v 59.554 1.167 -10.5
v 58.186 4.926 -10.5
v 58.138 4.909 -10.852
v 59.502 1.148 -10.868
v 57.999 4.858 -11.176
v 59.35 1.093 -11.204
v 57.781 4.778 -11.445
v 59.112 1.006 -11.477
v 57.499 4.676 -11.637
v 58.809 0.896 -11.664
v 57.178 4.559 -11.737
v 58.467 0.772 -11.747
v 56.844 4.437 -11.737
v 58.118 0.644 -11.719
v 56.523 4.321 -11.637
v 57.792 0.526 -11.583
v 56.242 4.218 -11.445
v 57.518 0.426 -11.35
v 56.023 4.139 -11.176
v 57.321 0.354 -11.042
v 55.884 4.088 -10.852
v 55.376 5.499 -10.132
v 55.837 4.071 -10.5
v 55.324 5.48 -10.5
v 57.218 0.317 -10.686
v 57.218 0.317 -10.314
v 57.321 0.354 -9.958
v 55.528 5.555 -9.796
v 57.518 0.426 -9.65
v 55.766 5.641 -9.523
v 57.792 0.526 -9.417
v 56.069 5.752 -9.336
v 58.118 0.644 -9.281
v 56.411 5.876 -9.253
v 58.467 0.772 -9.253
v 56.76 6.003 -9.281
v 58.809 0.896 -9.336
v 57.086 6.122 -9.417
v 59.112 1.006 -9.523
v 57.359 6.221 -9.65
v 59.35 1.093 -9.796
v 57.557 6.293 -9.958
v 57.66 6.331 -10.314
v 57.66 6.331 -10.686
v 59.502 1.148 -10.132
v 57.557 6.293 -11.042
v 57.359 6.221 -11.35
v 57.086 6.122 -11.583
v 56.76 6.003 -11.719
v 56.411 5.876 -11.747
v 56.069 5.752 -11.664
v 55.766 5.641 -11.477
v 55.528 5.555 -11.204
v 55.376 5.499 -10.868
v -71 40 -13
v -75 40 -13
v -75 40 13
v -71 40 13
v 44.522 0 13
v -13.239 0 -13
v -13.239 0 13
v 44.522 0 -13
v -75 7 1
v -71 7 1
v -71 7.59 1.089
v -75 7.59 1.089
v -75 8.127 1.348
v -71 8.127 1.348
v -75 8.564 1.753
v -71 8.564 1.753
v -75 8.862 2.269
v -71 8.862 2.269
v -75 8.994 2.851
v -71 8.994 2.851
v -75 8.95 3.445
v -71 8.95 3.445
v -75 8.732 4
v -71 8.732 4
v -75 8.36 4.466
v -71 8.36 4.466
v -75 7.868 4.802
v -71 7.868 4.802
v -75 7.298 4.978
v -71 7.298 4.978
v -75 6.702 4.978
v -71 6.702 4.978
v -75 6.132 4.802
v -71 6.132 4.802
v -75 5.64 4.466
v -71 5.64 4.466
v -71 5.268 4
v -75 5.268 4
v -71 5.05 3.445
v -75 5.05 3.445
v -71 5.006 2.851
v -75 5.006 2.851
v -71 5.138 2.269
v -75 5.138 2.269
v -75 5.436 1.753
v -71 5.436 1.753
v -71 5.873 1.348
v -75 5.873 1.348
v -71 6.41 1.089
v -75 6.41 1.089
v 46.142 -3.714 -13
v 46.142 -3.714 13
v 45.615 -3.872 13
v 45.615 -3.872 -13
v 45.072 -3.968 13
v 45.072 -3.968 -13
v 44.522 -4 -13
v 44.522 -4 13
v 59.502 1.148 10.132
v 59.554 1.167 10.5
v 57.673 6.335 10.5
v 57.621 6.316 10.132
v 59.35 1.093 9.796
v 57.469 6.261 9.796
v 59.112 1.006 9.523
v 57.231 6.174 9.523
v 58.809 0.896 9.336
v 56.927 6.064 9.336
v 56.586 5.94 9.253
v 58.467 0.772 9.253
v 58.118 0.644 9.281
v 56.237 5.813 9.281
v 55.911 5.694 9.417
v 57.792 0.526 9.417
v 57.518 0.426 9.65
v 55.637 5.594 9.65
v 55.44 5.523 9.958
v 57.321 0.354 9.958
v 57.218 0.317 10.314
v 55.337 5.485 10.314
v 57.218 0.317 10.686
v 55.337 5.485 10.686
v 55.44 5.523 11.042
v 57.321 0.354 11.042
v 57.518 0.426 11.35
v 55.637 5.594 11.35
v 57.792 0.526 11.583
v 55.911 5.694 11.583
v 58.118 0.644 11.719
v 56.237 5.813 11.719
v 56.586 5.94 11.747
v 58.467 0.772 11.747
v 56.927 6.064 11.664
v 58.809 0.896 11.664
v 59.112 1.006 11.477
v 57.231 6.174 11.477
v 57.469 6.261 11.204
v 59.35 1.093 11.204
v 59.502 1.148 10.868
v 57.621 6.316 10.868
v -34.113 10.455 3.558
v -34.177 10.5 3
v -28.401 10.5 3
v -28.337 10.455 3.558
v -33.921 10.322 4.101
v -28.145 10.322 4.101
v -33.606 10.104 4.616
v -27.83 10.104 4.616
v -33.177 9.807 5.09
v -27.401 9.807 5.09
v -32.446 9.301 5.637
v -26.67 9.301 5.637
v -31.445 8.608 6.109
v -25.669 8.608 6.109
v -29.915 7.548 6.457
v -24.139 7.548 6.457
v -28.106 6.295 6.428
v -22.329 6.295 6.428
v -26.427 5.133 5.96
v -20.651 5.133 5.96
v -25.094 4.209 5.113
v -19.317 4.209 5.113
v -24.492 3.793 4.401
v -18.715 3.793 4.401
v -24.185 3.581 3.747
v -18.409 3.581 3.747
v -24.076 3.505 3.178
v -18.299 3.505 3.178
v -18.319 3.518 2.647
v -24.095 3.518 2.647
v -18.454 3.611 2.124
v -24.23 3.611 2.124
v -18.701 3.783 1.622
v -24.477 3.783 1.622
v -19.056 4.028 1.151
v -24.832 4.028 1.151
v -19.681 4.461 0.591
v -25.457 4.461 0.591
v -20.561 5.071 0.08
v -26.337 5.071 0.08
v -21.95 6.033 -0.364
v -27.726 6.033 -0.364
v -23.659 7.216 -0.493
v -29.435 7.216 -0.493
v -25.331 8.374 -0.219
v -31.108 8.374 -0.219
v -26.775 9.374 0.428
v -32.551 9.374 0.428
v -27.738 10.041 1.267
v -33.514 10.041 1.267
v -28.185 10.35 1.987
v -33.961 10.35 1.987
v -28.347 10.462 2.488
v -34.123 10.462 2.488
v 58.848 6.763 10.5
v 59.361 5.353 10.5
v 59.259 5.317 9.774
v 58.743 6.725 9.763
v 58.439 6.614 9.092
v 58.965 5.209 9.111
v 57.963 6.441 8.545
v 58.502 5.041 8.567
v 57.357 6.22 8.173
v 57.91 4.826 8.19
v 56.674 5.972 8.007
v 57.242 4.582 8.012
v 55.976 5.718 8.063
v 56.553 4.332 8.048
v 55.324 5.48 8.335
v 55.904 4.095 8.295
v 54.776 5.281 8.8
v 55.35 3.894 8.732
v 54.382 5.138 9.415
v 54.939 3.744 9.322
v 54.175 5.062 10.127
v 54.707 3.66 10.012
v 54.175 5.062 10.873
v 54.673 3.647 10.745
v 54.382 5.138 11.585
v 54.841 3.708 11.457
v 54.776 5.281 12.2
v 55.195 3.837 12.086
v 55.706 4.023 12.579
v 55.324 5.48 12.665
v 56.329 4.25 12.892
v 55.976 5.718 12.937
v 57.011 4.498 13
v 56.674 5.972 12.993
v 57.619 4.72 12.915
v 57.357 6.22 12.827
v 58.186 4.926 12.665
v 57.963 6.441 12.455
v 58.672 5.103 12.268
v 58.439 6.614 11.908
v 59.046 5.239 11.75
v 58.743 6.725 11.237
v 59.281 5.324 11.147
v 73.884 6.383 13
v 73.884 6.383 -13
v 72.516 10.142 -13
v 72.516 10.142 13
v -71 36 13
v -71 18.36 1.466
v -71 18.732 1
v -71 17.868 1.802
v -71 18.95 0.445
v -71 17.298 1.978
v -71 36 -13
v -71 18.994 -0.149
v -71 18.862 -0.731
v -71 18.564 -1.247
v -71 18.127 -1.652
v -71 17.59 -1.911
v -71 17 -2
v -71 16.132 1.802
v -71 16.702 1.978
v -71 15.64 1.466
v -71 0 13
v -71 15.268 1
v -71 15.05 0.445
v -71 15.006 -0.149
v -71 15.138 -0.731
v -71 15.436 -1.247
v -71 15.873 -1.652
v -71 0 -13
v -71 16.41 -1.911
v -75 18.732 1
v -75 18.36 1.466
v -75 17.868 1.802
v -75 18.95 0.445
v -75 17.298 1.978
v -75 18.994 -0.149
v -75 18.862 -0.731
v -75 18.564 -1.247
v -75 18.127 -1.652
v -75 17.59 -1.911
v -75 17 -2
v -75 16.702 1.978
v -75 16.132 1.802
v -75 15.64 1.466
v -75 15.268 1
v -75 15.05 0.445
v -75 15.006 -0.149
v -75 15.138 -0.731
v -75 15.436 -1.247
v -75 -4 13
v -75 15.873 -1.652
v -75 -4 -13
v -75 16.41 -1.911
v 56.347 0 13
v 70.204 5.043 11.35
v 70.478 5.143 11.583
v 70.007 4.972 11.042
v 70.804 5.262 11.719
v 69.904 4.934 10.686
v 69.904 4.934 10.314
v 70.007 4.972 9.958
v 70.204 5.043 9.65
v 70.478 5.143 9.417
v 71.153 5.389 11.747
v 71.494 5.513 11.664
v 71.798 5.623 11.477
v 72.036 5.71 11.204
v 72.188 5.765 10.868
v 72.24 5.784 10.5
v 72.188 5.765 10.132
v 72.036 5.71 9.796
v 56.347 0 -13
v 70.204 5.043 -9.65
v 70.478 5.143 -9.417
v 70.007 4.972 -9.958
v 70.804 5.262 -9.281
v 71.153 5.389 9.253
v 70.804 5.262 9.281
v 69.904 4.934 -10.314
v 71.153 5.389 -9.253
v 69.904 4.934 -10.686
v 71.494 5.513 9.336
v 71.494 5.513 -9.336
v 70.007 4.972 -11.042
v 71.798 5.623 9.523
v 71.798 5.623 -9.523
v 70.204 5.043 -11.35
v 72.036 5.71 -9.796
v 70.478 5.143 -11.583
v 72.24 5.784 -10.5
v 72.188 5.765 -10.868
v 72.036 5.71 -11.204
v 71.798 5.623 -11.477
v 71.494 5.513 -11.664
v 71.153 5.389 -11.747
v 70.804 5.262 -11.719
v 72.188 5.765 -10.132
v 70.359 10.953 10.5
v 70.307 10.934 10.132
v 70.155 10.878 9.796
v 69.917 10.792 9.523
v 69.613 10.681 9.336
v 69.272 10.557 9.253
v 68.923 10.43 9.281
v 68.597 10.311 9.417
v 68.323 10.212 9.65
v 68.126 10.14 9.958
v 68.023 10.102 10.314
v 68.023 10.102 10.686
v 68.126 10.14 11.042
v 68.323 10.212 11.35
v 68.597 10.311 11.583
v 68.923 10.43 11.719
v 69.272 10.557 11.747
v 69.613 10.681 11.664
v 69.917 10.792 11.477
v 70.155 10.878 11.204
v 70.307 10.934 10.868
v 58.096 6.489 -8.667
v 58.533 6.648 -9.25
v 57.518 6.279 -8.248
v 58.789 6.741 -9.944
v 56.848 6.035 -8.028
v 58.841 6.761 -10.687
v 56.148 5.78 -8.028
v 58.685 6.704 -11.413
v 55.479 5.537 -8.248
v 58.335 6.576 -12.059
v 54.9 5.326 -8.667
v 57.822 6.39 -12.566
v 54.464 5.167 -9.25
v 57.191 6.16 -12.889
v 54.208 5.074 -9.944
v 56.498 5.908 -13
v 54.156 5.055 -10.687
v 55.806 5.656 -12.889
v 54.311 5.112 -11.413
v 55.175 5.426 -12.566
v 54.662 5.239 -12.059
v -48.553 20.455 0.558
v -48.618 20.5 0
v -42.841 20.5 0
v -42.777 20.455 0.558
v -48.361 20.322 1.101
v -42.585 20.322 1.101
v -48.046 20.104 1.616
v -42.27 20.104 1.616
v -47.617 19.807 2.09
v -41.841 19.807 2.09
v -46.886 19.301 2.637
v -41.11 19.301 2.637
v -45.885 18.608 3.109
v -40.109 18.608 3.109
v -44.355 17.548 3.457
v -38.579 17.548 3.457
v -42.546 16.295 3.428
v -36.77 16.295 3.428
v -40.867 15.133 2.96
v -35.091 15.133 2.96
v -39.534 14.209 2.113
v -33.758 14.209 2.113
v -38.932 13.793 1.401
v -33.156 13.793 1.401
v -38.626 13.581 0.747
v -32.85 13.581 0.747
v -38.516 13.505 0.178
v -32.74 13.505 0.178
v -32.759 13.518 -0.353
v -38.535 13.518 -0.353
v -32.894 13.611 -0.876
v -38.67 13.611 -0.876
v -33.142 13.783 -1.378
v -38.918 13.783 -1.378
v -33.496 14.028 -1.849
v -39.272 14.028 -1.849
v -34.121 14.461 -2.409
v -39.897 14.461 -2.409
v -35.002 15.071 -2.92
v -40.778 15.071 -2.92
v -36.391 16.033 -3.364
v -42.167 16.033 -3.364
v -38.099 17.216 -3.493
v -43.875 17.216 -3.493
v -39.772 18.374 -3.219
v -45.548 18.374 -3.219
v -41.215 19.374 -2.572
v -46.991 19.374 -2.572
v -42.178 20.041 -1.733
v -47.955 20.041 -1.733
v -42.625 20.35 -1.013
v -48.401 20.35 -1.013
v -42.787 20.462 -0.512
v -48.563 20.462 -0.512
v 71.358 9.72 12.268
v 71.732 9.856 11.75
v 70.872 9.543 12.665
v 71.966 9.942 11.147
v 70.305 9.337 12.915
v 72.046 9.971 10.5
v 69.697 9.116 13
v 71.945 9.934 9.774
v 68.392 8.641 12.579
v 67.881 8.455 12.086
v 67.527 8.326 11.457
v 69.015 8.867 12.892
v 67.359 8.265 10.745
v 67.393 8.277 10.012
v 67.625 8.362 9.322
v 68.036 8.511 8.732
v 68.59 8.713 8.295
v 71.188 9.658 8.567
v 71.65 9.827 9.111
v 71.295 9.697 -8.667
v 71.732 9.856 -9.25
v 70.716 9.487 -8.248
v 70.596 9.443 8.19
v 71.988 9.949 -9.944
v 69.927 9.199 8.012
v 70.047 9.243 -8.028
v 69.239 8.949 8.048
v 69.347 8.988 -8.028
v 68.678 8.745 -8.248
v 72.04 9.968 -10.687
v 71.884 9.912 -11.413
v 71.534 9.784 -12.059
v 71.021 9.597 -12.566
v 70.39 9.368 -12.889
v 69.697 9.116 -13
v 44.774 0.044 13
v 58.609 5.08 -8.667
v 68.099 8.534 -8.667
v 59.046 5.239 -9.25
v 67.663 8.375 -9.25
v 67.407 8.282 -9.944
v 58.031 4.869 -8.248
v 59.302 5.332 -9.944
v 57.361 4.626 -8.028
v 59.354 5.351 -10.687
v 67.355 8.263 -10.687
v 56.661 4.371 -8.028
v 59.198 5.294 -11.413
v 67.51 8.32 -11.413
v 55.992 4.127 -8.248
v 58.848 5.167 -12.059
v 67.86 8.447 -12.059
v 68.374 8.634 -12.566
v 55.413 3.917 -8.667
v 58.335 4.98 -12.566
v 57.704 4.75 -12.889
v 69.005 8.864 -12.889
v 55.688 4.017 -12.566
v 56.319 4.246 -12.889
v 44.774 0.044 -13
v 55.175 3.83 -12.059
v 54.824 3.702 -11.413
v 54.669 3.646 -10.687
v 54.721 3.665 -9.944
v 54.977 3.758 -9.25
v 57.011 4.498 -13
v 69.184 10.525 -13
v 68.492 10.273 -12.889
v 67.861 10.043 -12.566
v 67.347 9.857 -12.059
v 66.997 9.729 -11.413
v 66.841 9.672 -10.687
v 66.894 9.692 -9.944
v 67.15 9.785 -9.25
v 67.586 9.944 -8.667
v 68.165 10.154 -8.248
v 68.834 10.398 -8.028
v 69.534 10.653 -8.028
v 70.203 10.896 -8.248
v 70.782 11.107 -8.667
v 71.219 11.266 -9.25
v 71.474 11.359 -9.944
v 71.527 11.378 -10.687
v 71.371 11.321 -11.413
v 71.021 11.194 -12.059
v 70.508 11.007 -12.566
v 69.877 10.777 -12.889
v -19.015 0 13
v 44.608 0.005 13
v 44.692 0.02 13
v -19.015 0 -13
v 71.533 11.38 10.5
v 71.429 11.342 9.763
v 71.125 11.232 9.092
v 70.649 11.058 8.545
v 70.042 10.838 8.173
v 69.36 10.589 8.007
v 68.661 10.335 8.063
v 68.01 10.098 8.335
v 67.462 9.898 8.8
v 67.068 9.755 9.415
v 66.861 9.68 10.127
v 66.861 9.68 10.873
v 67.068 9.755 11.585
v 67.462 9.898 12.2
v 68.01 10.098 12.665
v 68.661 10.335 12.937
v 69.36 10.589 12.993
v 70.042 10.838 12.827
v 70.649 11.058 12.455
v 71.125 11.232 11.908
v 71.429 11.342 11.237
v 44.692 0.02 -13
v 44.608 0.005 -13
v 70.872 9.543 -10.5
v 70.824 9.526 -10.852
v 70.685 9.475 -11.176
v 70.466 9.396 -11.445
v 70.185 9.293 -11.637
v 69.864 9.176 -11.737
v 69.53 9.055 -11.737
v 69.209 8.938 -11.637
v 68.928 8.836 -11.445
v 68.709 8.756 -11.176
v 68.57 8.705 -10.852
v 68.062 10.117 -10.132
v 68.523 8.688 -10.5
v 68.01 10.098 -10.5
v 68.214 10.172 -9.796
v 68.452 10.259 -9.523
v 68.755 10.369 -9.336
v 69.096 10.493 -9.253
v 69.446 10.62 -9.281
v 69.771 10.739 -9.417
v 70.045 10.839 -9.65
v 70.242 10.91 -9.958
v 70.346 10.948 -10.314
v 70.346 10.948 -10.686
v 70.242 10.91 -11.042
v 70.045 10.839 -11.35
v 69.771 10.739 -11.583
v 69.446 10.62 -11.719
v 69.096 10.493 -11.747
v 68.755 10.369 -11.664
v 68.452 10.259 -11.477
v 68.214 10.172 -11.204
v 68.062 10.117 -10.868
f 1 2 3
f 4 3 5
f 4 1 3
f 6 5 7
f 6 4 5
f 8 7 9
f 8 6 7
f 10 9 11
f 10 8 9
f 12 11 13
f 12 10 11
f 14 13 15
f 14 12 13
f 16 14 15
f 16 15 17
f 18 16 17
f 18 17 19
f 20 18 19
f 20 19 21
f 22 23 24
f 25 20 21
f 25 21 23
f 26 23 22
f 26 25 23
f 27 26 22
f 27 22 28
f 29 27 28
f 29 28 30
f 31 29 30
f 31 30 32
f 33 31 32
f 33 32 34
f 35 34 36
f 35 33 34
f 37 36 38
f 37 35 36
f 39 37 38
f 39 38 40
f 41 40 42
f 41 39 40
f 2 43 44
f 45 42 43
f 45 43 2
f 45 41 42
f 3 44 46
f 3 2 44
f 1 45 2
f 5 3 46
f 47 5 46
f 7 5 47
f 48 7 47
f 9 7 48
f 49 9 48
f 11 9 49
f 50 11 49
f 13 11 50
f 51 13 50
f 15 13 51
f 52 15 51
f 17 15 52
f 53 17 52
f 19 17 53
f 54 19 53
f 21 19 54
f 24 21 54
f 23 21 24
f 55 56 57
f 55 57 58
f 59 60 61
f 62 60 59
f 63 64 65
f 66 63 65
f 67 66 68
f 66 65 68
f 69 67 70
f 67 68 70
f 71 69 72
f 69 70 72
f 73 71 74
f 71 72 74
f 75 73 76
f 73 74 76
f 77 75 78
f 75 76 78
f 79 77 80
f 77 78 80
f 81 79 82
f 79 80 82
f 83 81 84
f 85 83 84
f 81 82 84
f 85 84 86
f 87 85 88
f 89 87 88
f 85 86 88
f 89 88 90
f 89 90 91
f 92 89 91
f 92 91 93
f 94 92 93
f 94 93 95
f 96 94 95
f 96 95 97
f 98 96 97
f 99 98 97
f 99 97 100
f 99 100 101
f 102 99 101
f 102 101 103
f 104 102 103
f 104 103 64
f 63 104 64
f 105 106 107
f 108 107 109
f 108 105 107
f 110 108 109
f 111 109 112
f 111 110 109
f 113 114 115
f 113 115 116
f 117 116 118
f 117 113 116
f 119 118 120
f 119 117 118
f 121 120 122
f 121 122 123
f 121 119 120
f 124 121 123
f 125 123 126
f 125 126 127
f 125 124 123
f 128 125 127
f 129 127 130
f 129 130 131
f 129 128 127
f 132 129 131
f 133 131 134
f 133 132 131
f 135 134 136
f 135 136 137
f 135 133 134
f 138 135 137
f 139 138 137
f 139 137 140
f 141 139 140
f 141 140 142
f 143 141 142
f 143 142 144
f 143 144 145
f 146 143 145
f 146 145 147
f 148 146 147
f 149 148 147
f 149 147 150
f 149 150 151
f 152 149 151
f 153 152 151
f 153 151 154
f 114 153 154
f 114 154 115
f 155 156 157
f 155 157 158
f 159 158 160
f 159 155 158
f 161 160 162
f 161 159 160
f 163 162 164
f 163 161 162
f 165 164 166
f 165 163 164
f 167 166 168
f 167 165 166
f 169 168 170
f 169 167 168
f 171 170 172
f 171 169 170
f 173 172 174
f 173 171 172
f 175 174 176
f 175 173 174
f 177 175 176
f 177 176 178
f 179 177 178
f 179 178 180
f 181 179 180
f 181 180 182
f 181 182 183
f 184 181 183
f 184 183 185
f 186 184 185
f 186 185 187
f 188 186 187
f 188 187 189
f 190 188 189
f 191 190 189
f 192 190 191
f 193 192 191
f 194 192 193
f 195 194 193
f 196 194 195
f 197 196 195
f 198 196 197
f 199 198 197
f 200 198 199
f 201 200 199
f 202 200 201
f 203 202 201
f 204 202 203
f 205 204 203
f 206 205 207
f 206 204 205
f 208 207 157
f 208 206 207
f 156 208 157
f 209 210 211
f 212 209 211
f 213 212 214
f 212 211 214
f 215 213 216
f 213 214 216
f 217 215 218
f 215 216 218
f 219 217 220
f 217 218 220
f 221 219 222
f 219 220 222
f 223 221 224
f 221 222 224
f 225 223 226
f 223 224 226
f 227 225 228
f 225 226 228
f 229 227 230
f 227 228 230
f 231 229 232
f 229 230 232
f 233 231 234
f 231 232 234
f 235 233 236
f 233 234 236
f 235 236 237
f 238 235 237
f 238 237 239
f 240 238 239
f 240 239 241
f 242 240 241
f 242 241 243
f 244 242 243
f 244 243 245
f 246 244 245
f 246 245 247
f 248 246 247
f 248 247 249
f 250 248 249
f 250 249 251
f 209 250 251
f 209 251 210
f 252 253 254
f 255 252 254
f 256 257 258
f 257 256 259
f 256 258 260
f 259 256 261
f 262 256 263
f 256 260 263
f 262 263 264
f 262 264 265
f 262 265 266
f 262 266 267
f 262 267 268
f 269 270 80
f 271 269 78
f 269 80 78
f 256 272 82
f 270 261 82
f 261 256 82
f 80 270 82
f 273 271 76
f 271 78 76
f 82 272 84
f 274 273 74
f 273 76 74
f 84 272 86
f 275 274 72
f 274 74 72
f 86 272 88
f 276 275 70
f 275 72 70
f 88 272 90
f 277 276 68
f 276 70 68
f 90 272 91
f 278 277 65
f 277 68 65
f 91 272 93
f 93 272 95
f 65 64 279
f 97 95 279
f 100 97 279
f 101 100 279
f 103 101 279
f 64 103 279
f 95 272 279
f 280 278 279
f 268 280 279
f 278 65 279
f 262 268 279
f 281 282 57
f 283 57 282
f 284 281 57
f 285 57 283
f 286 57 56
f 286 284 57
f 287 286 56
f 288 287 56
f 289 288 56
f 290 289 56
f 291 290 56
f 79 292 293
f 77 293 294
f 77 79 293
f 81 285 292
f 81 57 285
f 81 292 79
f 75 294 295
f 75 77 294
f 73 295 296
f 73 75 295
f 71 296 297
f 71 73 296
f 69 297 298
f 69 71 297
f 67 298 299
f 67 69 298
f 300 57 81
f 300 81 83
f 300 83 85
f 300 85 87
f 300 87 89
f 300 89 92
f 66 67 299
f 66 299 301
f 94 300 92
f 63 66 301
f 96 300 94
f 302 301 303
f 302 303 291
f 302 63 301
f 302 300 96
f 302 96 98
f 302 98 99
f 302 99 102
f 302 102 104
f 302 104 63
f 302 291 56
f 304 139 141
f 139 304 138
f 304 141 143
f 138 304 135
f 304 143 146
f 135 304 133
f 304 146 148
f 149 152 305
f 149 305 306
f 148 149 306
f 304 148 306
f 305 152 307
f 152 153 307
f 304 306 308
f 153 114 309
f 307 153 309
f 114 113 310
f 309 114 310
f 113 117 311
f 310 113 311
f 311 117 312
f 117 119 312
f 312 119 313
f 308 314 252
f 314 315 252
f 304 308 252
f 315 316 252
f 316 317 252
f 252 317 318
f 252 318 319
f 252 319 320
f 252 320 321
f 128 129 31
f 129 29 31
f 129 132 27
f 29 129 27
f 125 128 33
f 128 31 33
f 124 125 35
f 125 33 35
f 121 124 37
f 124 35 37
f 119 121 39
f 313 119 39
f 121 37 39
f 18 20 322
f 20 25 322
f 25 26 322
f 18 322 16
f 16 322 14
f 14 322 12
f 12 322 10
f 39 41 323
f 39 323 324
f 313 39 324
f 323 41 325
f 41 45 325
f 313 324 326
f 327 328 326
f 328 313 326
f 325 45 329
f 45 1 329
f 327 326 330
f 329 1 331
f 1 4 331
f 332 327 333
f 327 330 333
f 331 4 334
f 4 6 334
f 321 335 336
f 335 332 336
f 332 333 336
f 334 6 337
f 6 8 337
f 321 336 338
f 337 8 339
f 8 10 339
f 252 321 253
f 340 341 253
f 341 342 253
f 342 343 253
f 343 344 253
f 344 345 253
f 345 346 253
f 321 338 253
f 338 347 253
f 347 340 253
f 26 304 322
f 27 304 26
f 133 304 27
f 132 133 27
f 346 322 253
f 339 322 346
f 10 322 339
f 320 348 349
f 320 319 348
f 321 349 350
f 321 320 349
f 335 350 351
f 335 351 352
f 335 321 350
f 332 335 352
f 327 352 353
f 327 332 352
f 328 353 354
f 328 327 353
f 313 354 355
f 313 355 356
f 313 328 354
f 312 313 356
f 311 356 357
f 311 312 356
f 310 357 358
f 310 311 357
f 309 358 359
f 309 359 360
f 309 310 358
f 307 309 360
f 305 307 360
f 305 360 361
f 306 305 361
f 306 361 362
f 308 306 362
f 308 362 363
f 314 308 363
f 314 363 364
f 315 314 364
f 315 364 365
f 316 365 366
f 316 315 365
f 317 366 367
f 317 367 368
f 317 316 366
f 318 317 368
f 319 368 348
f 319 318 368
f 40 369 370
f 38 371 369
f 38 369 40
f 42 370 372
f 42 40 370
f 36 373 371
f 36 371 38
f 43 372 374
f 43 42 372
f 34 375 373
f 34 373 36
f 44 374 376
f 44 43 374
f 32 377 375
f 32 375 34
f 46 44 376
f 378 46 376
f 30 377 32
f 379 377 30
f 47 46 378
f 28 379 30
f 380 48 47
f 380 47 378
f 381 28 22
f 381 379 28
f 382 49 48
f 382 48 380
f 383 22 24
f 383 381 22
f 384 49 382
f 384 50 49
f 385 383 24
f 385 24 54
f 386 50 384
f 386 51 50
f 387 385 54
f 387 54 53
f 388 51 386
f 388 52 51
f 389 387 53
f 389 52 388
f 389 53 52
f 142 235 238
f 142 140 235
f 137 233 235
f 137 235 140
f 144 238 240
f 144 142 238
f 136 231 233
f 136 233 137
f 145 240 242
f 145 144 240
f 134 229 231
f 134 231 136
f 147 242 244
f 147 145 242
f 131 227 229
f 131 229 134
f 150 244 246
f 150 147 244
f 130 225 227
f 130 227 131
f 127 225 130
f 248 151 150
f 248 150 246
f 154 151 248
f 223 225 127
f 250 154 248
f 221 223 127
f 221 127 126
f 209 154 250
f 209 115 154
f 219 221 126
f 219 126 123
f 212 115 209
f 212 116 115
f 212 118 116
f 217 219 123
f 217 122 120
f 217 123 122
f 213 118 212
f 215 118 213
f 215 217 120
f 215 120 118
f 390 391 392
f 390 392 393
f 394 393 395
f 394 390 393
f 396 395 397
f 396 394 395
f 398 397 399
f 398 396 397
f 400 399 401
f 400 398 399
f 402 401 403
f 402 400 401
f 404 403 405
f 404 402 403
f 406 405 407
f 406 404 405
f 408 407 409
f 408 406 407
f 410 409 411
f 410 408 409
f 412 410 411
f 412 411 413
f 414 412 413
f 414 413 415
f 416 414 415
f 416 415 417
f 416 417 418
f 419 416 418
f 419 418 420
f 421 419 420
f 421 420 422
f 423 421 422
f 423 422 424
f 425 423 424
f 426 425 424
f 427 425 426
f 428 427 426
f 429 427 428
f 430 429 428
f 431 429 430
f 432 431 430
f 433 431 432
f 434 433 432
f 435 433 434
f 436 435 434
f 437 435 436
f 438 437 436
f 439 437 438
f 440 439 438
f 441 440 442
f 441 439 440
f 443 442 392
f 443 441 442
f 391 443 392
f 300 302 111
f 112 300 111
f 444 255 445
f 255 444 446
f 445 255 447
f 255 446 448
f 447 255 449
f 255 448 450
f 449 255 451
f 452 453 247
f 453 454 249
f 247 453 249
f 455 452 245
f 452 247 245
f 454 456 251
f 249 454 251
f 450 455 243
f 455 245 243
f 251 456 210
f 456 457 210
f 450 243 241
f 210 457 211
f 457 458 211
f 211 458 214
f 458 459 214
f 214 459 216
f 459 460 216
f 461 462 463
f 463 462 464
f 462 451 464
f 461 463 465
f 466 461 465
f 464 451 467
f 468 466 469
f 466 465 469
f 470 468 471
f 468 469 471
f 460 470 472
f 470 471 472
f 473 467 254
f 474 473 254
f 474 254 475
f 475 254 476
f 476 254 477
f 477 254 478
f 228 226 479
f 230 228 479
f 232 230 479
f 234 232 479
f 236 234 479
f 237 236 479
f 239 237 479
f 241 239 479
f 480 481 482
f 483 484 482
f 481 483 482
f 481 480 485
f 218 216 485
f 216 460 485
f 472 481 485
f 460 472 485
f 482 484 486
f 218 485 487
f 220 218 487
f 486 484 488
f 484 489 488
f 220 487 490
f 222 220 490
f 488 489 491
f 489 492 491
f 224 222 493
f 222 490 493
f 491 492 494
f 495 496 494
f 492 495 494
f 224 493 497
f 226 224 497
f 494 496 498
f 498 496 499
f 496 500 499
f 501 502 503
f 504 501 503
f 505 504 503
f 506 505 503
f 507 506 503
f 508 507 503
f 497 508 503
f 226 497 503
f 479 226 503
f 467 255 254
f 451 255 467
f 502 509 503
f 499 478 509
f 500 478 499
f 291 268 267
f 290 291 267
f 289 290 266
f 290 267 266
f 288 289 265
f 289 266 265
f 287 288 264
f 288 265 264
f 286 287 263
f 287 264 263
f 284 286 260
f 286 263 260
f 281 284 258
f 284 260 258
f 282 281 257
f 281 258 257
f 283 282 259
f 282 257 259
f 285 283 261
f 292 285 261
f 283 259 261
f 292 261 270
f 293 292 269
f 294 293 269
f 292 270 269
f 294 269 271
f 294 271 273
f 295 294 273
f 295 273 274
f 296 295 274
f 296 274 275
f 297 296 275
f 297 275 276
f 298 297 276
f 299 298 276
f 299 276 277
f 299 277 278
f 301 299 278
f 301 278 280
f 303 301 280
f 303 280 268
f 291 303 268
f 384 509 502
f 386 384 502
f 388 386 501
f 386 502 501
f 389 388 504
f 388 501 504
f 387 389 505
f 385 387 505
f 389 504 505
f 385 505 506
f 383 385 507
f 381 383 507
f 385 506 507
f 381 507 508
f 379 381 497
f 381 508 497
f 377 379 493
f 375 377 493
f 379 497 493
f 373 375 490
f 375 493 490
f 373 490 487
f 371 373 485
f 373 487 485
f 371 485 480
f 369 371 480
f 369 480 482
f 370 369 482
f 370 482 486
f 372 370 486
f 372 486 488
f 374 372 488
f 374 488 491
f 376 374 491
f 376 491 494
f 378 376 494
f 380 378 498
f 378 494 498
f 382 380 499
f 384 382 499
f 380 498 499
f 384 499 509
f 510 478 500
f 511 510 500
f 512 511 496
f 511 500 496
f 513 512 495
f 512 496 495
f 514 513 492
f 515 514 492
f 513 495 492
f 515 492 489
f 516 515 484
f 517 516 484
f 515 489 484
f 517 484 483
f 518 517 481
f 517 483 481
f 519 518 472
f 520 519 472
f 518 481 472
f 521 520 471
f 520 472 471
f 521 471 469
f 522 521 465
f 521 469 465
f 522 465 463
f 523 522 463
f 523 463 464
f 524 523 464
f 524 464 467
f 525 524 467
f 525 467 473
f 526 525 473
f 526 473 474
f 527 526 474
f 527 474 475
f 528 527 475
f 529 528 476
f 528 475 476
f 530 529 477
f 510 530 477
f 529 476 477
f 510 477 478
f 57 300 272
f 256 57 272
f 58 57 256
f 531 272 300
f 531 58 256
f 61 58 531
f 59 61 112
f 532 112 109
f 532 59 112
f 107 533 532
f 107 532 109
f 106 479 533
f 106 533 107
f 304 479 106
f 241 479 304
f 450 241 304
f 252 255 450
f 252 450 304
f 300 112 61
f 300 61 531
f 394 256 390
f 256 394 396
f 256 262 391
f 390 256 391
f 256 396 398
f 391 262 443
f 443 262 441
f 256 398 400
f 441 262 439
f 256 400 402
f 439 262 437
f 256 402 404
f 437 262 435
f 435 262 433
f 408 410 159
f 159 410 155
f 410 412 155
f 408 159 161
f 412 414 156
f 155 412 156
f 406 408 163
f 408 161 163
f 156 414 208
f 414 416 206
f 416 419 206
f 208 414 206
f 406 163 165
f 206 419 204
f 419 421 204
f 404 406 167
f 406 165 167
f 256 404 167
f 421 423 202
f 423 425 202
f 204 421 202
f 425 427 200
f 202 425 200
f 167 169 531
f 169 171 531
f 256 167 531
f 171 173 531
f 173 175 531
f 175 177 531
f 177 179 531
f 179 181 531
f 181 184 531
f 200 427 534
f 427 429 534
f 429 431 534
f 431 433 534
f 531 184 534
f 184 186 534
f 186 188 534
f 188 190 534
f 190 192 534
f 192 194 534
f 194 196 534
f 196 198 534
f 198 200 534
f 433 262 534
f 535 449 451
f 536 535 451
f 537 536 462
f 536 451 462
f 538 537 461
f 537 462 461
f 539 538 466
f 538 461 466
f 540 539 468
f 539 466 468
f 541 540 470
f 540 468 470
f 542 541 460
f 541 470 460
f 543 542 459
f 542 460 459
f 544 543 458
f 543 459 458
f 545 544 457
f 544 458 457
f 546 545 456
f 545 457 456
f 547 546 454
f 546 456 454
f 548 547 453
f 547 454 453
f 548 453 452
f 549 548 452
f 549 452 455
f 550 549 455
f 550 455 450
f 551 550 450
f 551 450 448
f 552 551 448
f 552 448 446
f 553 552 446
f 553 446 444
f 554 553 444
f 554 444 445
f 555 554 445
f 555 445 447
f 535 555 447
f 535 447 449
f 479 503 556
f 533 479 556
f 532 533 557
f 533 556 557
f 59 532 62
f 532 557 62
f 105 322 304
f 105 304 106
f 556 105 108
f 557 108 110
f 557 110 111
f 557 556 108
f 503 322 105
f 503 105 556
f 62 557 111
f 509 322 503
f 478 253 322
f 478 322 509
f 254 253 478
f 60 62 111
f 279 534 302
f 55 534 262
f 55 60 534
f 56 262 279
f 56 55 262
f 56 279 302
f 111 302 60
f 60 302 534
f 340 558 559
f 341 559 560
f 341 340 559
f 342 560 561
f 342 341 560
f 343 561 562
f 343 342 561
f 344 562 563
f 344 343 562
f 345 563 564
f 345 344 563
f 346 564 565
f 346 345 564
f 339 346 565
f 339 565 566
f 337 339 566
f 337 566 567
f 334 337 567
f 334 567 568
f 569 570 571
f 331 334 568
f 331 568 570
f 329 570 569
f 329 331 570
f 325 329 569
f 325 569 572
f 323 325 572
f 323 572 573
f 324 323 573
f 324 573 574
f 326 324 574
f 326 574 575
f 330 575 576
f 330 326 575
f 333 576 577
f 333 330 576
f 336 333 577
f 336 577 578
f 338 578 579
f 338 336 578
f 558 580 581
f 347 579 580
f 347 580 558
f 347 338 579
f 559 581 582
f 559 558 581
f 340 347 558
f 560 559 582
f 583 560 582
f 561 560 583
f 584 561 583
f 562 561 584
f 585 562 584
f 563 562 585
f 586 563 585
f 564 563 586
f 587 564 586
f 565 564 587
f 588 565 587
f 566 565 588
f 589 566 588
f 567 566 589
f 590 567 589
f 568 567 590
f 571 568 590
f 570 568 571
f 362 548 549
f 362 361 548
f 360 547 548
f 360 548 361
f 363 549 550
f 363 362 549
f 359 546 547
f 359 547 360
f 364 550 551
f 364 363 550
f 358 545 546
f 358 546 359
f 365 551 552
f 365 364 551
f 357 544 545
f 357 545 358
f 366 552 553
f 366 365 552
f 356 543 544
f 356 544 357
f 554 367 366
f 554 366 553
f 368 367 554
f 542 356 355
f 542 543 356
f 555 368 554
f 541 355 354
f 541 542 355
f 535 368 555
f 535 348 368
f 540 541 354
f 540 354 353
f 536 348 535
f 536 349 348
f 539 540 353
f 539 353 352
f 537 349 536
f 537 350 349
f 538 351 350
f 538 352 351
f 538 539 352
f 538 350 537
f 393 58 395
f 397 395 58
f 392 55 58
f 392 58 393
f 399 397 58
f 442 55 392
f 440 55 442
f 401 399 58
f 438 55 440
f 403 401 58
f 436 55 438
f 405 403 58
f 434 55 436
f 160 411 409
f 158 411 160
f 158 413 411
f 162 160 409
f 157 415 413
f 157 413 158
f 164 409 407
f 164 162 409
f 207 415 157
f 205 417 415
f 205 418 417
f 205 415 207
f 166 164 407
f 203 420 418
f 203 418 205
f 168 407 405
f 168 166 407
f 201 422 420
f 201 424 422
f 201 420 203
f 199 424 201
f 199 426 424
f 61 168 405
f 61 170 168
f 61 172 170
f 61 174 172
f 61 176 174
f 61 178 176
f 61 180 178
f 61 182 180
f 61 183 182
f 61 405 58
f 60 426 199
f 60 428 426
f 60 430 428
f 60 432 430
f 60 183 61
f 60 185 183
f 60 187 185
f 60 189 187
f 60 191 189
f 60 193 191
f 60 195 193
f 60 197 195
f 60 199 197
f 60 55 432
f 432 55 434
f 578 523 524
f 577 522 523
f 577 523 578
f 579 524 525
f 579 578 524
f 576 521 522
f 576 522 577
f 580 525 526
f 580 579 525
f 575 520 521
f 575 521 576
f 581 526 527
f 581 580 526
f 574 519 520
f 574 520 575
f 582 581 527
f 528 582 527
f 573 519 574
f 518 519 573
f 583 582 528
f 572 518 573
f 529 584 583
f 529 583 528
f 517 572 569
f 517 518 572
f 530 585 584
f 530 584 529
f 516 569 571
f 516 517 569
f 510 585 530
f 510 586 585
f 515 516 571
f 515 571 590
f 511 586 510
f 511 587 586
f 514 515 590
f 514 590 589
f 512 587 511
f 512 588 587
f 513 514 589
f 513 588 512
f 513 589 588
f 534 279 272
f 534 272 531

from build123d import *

# Parameters (mm, degrees)
ESQUISSE2_W                 = 150
ESQUISSE2_H                 = 26
T_LE_DE_BASE_PLI_E1_DEPTH   = 4
PLI_START                   = -13
PLI_ESQUISS_1_DEPTH         = 26
PLI_ESQUISS_1_2_DEPTH       = 26
ESQUISSE9_R                 = 2.5
ESQUISSE9_R_2               = 1.25
BOSS_EXTRU_1_DEPTH          = 1.5
ENL_V_START                 = -4
ENL_V_MAT_EXTRU_1_OUTLINE_R = 1.25
ENL_V_MAT_EXTRU_1_DEPTH     = 4
ESQUISSE11_W                = 4
ESQUISSE11_H                = 26
BOSS_EXTRU_2_DEPTH          = 40
BOSS_EXTRU_3_DEPTH          = 4
ESQUISSE12_R                = 2
ENL_V_MAT_EXTRU_5_DEPTH     = 151.86574353
ENL_V_MAT_EXTRU_6_REACH     = 152.866
ESQUISSE12_4_R              = 3.5
ESQUISSE12_4_R_2            = 2


# Read off the part's stored shape, not the designer's step: Pli esquissé1, Enlèv. mat.-Extru.1
# Sheet-metal steps are written as plain solids
with BuildPart() as part:
    # Esquisse2 → Tôle de base pliée1 (new body)
    with BuildSketch(Plane(origin=(0, 0, 0), x_dir=(1, 0, 0), z_dir=(0, 1, 0))):
        Rectangle(ESQUISSE2_W, ESQUISSE2_H)
    extrude(amount=-T_LE_DE_BASE_PLI_E1_DEPTH)

    # Pli esquissé1 outline → Pli esquissé1 (cut)
    with BuildSketch(Plane.XY.offset(PLI_START)):
        with BuildLine():
            Line((75, 0), (56.347473252, 0))
            Line((56.347473252, 0), (46.142385808, -3.714348068))
            ThreePointArc((46.142385808, -3.714348068), (45.344875155, -3.928040403), (44.522373197, -4))
            Line((44.522373197, -4), (75, -4))
            Line((75, -4), (75, 0))
        make_face()
    extrude(amount=PLI_ESQUISS_1_DEPTH, mode=Mode.SUBTRACT)

    # Pli esquiss_1 2 outline → Pli esquiss_1 2 (add)
    with BuildSketch(Plane.XY.offset(PLI_START)):
        with BuildLine():
            Line((56.347473252, 0), (73.884342049, 6.382898245))
            Line((73.884342049, 6.382898245), (72.516261476, 10.141668728))
            Line((72.516261476, 10.141668728), (44.774305234, 0.044422416))
            ThreePointArc((44.774305234, 0.044422416), (44.650282444, 0.011190609), (44.522373197, 0))
            Line((44.522373197, 0), (56.347473252, 0))
        make_face()
    extrude(amount=PLI_ESQUISS_1_2_DEPTH)

    # Esquisse9 → Boss.-Extru.1 (add)
    # profile 1 of 4: a face of its own
    with BuildSketch(Plane(origin=(5.223321668, -14.350958338, 0), x_dir=(0.9396926207859082, 0.34202014332566943, 0), z_dir=(-0.34202014332566943, 0.9396926207859082, 0))):
        with Locations(Location((55.111650787, 10.5, 0), (0, 0, 90))):
            Circle(ESQUISSE9_R)
        with Locations(Location((55.111650787, 10.5, 0), (0, 0, 180))):
            Circle(ESQUISSE9_R_2, mode=Mode.SUBTRACT)
    # profile 2 of 4: a face of its own
    with BuildSketch(Plane(origin=(5.223321668, -14.350958338, 0), x_dir=(0.9396926207859082, 0.34202014332566943, 0), z_dir=(-0.34202014332566943, 0.9396926207859082, 0))):
        with Locations(Location((68.611650787, 10.5, 0), (0, 0, 90))):
            Circle(ESQUISSE9_R)
        with Locations(Location((68.611650787, 10.5, 0), (0, 0, 180))):
            Circle(ESQUISSE9_R_2, mode=Mode.SUBTRACT)
    # profile 3 of 4: a face of its own
    with BuildSketch(Plane(origin=(5.223321668, -14.350958338, 0), x_dir=(0.9396926207859082, 0.34202014332566943, 0), z_dir=(-0.34202014332566943, 0.9396926207859082, 0))):
        with Locations((68.611650787, -10.5)):
            Circle(ESQUISSE9_R)
        with Locations((68.611650787, -10.5)):
            Circle(ESQUISSE9_R_2, mode=Mode.SUBTRACT)
    # profile 4 of 4: a face of its own
    with BuildSketch(Plane(origin=(5.223321668, -14.350958338, 0), x_dir=(0.9396926207859082, 0.34202014332566943, 0), z_dir=(-0.34202014332566943, 0.9396926207859082, 0))):
        with Locations((55.111650787, -10.5)):
            Circle(ESQUISSE9_R)
        with Locations((55.111650787, -10.5)):
            Circle(ESQUISSE9_R_2, mode=Mode.SUBTRACT)
    extrude(amount=BOSS_EXTRU_1_DEPTH)

    # Enlèv. mat.-Extru.1 outline → Enlèv. mat.-Extru.1 (cut)
    with BuildSketch(Plane(origin=(5.223321668, -14.350958338, 0), x_dir=(0.9396926207859082, 0.34202014332566943, 0), z_dir=(-0.34202014332566943, 0.9396926207859082, 0)).offset(ENL_V_START)):
        with Locations((68.611650787, 10.5)):
            Circle(ENL_V_MAT_EXTRU_1_OUTLINE_R)
        with Locations((68.611650787, -10.5)):
            Circle(ENL_V_MAT_EXTRU_1_OUTLINE_R)
        with Locations((55.111650787, 10.5)):
            Circle(ENL_V_MAT_EXTRU_1_OUTLINE_R)
        with Locations((55.111650787, -10.5)):
            Circle(ENL_V_MAT_EXTRU_1_OUTLINE_R)
    extrude(amount=ENL_V_MAT_EXTRU_1_DEPTH, mode=Mode.SUBTRACT)

    # Esquisse11 → Boss.-Extru.2 (add)
    with BuildSketch(Plane(origin=(0, 0, 0), x_dir=(1, 0, 0), z_dir=(0, 1, 0))):
        with Locations((-73, 0)):
            Rectangle(ESQUISSE11_W, ESQUISSE11_H)
    extrude(amount=BOSS_EXTRU_2_DEPTH)

    # Esquisse3D1 → Boss.-Extru.3 (add, along a direction that is not the sketch's normal)
    with BuildSketch(Plane(origin=(-71, 40, -13), x_dir=(0.7710162866859277, -0.533933827949873, 0.34705698816741753), z_dir=(0.5693204883585811, 0.8221156740600114, 0))):
        Polygon((0, 0), (9.023481692, -24.38394509), (74.915650416, 0), (65.892168724, 24.38394509), align=None)
    extrude(amount=-BOSS_EXTRU_3_DEPTH, dir=(0, 1, 0))

    # Esquisse12 → Enlèv. mat.-Extru.5 (cut, through all)
    with BuildSketch(Plane(origin=(-71, 0, 0), x_dir=(0, 0, -1), z_dir=(1, 0, 0))):
        with Locations((-3, 7)):
            Circle(ESQUISSE12_R)
        with Locations((0, 17)):
            Circle(ESQUISSE12_R)
    extrude(amount=-ENL_V_MAT_EXTRU_5_DEPTH, mode=Mode.SUBTRACT)

    # Enlèv. mat.-Extru.6: up to this plane
    enl_v_mat_extru_6_end = Plane(origin=(-4.291041229, -6.196390829, 0), z_dir=(0.5693204883585812, 0.8221156740600113, 0))
    # Esquisse12<4> → Enlèv. mat.-Extru.6 (cut, up to the surface)
    with BuildSketch(Plane(origin=(-71, 0, 0), x_dir=(0, 0, -1), z_dir=(1, 0, 0)), mode=Mode.PRIVATE) as enl_v_mat_extru_6_sk1:
        with Locations(Location((-3, 7, 0), (0, 0, 90))):
            Circle(ESQUISSE12_4_R)
        with Locations((-3, 7)):
            Circle(ESQUISSE12_4_R_2, mode=Mode.SUBTRACT)
    enl_v_mat_extru_6_tool1 = split(extrude(enl_v_mat_extru_6_sk1.sketch, amount=ENL_V_MAT_EXTRU_6_REACH, mode=Mode.PRIVATE), bisect_by=enl_v_mat_extru_6_end, keep=Keep.BOTH, mode=Mode.PRIVATE)
    add(enl_v_mat_extru_6_tool1.solids().sort_by_distance((-71, 3.598995, 3))[0], mode=Mode.SUBTRACT)
    # Esquisse12<4> → Enlèv. mat.-Extru.6 (cut, up to the surface)
    with BuildSketch(Plane(origin=(-71, 0, 0), x_dir=(0, 0, -1), z_dir=(1, 0, 0)), mode=Mode.PRIVATE) as enl_v_mat_extru_6_sk2:
        with Locations((-3, 7)):
            Circle(ESQUISSE12_4_R_2)
    enl_v_mat_extru_6_tool2 = split(extrude(enl_v_mat_extru_6_sk2.sketch, amount=ENL_V_MAT_EXTRU_6_REACH, mode=Mode.PRIVATE), bisect_by=enl_v_mat_extru_6_end, keep=Keep.BOTH, mode=Mode.PRIVATE)
    add(enl_v_mat_extru_6_tool2.solids().sort_by_distance((-71, 7, 3))[0], mode=Mode.SUBTRACT)
    # Esquisse12<4> → Enlèv. mat.-Extru.6 (cut, up to the surface)
    with BuildSketch(Plane(origin=(-71, 0, 0), x_dir=(0, 0, -1), z_dir=(1, 0, 0)), mode=Mode.PRIVATE) as enl_v_mat_extru_6_sk3:
        with Locations(Location((0, 17, 0), (0, 0, 90))):
            Circle(ESQUISSE12_4_R)
        with Locations((0, 17)):
            Circle(ESQUISSE12_4_R_2, mode=Mode.SUBTRACT)
    enl_v_mat_extru_6_tool3 = split(extrude(enl_v_mat_extru_6_sk3.sketch, amount=ENL_V_MAT_EXTRU_6_REACH, mode=Mode.PRIVATE), bisect_by=enl_v_mat_extru_6_end, keep=Keep.BOTH, mode=Mode.PRIVATE)
    add(enl_v_mat_extru_6_tool3.solids().sort_by_distance((-71, 13.598995, 0))[0], mode=Mode.SUBTRACT)
    # Esquisse12<4> → Enlèv. mat.-Extru.6 (cut, up to the surface)
    with BuildSketch(Plane(origin=(-71, 0, 0), x_dir=(0, 0, -1), z_dir=(1, 0, 0)), mode=Mode.PRIVATE) as enl_v_mat_extru_6_sk4:
        with Locations((0, 17)):
            Circle(ESQUISSE12_4_R_2)
    enl_v_mat_extru_6_tool4 = split(extrude(enl_v_mat_extru_6_sk4.sketch, amount=ENL_V_MAT_EXTRU_6_REACH, mode=Mode.PRIVATE), bisect_by=enl_v_mat_extru_6_end, keep=Keep.BOTH, mode=Mode.PRIVATE)
    add(enl_v_mat_extru_6_tool4.solids().sort_by_distance((-71, 17, 0))[0], mode=Mode.SUBTRACT)


solid = part.part
